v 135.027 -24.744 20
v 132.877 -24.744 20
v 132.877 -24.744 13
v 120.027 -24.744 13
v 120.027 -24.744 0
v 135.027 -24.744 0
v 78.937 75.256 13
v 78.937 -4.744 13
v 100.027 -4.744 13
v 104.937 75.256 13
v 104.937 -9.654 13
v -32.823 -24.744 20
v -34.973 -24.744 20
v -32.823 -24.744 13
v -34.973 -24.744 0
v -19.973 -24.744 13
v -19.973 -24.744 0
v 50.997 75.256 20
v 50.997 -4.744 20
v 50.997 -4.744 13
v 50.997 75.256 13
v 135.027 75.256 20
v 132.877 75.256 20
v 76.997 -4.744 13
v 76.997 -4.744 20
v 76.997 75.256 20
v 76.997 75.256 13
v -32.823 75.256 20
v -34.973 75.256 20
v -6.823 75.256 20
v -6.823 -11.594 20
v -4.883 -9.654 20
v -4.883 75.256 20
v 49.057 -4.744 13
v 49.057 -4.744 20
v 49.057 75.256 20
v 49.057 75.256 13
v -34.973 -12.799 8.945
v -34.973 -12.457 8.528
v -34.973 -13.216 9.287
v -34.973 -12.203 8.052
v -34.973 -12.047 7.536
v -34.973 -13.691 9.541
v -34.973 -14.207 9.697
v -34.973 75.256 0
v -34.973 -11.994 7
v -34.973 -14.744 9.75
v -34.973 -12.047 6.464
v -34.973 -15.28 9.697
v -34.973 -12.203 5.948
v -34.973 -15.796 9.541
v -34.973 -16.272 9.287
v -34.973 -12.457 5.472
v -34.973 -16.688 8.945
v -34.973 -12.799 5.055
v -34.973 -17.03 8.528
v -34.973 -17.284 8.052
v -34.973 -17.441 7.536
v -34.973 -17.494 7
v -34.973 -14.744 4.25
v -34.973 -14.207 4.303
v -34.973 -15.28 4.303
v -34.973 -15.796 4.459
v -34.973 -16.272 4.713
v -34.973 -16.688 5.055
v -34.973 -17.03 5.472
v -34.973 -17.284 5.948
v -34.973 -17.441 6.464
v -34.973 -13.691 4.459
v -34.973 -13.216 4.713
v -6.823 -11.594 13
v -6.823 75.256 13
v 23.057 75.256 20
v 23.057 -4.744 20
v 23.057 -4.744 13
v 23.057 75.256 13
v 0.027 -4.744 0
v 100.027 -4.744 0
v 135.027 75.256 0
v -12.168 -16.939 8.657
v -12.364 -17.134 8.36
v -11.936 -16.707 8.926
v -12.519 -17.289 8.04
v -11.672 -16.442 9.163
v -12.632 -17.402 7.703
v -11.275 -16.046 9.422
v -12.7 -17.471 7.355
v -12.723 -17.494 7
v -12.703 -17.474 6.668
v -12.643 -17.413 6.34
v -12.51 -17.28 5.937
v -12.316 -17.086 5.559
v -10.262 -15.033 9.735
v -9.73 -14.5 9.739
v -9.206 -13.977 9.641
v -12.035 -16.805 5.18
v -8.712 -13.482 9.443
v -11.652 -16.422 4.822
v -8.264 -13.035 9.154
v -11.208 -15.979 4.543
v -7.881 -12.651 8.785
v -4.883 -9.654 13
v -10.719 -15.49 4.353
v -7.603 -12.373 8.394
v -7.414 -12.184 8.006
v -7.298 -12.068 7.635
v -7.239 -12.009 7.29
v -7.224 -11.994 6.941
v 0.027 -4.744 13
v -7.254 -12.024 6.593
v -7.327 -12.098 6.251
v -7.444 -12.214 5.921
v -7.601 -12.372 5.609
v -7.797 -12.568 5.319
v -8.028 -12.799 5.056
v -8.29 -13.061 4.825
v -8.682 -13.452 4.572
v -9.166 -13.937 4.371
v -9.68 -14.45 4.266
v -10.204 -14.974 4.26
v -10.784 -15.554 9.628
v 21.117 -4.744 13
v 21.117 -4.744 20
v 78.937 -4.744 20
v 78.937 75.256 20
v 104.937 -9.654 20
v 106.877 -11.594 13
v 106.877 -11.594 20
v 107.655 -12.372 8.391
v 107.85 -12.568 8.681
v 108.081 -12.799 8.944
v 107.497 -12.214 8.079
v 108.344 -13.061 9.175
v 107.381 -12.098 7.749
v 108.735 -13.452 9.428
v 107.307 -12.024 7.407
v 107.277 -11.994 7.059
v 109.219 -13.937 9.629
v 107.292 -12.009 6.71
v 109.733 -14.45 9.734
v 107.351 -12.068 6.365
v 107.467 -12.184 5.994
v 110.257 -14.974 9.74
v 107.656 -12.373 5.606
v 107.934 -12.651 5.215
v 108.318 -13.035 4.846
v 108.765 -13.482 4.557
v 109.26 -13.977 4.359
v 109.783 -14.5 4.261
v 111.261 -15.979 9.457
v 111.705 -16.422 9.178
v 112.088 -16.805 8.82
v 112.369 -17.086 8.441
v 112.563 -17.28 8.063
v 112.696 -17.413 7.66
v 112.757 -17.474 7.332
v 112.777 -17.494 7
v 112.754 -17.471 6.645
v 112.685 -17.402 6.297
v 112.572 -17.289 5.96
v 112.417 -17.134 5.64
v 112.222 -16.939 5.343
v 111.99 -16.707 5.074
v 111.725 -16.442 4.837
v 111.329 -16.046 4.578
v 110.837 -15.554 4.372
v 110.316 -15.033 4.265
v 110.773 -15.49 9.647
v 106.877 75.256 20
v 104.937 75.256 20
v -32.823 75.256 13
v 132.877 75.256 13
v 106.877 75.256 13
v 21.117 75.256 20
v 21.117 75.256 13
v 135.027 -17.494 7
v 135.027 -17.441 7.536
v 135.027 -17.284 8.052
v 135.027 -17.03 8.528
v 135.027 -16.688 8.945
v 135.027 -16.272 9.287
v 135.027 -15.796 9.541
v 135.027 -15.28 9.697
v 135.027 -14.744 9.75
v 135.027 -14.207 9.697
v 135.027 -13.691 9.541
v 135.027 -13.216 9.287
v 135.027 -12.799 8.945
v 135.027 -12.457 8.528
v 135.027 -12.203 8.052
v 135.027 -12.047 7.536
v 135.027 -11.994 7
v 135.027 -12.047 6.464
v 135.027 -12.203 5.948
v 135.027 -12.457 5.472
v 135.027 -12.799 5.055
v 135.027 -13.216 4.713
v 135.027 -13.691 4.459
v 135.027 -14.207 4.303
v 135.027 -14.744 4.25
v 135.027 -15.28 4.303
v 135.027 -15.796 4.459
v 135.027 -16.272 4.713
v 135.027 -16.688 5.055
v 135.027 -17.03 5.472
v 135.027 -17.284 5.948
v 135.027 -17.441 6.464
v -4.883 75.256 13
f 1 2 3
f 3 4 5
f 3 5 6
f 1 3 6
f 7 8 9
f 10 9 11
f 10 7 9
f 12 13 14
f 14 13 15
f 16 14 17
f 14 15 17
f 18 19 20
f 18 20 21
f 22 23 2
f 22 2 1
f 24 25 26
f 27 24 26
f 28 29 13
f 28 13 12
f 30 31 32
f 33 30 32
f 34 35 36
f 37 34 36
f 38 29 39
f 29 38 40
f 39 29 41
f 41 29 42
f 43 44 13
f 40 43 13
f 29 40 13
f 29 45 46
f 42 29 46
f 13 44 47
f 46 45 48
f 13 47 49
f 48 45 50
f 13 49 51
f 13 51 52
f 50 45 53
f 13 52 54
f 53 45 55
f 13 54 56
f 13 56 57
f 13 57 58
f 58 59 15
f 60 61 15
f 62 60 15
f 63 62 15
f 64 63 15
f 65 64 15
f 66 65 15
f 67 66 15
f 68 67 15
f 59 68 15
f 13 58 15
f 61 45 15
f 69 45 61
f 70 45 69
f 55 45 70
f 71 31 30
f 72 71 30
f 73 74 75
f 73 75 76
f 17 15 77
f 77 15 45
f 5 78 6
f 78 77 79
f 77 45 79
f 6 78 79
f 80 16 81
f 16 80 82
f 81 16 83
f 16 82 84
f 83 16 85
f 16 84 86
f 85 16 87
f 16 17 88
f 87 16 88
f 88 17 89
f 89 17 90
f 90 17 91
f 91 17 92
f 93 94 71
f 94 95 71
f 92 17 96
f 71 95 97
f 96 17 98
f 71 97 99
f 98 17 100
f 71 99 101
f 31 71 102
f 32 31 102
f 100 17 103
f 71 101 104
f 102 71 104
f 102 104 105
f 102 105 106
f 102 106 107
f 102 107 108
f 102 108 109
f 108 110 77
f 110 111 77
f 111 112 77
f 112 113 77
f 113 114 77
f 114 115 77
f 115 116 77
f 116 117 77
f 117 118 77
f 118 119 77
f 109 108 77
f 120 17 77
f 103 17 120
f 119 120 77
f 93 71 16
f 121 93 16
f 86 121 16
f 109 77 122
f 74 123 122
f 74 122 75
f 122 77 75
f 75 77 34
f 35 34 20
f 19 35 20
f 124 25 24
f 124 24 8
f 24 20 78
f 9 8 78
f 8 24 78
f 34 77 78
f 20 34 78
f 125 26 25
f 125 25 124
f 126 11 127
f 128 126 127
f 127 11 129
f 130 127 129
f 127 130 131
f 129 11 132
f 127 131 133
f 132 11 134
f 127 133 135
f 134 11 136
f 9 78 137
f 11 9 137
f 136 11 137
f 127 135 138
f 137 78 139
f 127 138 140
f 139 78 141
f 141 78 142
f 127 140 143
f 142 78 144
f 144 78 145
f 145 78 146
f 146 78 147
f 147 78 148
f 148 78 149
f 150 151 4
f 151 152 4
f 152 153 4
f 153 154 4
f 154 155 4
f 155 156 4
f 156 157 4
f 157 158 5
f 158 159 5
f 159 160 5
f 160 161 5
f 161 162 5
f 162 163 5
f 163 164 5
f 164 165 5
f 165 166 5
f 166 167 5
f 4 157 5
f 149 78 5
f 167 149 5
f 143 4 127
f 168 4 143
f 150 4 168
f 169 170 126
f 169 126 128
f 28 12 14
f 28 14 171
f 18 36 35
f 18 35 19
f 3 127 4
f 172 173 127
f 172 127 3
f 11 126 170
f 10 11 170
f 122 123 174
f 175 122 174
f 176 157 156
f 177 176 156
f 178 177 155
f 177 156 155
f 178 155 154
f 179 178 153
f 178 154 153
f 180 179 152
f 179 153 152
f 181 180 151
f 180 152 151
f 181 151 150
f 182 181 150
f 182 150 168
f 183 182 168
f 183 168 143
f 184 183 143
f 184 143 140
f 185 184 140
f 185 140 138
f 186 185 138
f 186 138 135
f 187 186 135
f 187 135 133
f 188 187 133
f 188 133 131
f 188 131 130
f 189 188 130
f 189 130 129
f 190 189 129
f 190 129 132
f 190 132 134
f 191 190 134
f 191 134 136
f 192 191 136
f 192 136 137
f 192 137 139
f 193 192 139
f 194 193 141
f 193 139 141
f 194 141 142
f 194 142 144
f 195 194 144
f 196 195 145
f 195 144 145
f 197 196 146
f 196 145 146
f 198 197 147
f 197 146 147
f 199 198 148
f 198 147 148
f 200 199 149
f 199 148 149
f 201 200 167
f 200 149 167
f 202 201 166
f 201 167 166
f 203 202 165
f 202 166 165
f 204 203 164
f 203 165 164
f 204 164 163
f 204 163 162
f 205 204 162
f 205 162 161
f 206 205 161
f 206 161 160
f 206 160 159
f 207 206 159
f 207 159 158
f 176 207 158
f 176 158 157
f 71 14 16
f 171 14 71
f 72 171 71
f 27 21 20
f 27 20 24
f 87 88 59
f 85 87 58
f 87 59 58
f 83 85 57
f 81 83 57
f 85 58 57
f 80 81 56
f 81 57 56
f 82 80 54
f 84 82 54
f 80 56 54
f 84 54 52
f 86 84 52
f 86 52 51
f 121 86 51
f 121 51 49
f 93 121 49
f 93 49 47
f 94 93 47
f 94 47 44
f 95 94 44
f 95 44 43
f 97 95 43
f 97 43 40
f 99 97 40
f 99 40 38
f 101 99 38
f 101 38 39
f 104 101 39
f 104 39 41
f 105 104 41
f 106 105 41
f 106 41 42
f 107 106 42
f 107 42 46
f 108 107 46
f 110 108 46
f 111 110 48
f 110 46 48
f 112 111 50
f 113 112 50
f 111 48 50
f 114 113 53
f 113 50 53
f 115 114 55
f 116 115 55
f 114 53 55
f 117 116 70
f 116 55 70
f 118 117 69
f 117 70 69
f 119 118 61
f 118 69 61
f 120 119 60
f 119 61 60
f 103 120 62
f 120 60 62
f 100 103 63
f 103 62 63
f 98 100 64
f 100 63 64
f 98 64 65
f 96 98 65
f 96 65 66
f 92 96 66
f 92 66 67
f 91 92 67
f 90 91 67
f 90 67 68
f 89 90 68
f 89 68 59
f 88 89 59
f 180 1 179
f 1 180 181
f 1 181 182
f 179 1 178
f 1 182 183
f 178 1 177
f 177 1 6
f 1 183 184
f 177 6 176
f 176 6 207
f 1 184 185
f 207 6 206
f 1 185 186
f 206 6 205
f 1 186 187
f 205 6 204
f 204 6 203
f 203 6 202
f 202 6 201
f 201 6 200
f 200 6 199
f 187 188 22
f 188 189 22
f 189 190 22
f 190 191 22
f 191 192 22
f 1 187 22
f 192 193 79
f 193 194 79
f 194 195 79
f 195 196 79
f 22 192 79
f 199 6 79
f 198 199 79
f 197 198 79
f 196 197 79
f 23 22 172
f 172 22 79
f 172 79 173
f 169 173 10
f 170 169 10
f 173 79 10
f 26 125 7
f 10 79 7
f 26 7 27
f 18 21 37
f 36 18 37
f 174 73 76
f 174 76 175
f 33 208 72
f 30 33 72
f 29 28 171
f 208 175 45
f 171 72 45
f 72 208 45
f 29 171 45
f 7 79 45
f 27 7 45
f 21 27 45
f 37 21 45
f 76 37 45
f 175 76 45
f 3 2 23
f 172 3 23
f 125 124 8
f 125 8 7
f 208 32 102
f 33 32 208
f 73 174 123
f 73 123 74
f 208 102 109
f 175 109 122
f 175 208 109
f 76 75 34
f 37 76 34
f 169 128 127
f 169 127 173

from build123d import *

# Parameters (mm, degrees)
F1_DEPTH = 20
F2_W     = 26
F2_H     = 113.192833
F3_DEPTH = 7
F4_R     = 2.75
F5_DEPTH = 170


with BuildPart() as f1:
    # F0 (on Top) → F1 (new body)
    with BuildSketch(Plane.XY):
        Polygon((-34.973299, 75.256209), (-34.973299, -24.743791), (-19.973299, -24.743791), (0.026701, -4.743791), (100.026701, -4.743791), (120.026701, -24.743791), (135.026701, -24.743791), (135.026701, 75.256209), align=None)
    extrude(amount=F1_DEPTH)

    # F2 (on face) → F3 (cut)
    with BuildSketch(Plane.XY.offset(20)):
        with Locations((-19.823299, 26.061079)):
            Rectangle(F2_W, F2_H)
        with Locations((8.116701, 26.061079)):
            Rectangle(F2_W, F2_H)
        with Locations((36.056701, 26.061079)):
            Rectangle(F2_W, F2_H)
        with Locations((63.996701, 26.061079)):
            Rectangle(F2_W, F2_H)
        with Locations((91.936701, 26.061079)):
            Rectangle(F2_W, F2_H)
        with Locations((119.876701, 26.061079)):
            Rectangle(F2_W, F2_H)
    extrude(amount=-F3_DEPTH, mode=Mode.SUBTRACT)

    # F4 (on face) → F5 (cut, through all)
    with BuildSketch(Plane(origin=(-34.973299, 0, 0), x_dir=(0, -1, 0), z_dir=(-1, 0, 0))):
        with Locations((14.743791, 7)):
            Circle(F4_R)
    extrude(amount=-F5_DEPTH, mode=Mode.SUBTRACT)


solid = f1.part
